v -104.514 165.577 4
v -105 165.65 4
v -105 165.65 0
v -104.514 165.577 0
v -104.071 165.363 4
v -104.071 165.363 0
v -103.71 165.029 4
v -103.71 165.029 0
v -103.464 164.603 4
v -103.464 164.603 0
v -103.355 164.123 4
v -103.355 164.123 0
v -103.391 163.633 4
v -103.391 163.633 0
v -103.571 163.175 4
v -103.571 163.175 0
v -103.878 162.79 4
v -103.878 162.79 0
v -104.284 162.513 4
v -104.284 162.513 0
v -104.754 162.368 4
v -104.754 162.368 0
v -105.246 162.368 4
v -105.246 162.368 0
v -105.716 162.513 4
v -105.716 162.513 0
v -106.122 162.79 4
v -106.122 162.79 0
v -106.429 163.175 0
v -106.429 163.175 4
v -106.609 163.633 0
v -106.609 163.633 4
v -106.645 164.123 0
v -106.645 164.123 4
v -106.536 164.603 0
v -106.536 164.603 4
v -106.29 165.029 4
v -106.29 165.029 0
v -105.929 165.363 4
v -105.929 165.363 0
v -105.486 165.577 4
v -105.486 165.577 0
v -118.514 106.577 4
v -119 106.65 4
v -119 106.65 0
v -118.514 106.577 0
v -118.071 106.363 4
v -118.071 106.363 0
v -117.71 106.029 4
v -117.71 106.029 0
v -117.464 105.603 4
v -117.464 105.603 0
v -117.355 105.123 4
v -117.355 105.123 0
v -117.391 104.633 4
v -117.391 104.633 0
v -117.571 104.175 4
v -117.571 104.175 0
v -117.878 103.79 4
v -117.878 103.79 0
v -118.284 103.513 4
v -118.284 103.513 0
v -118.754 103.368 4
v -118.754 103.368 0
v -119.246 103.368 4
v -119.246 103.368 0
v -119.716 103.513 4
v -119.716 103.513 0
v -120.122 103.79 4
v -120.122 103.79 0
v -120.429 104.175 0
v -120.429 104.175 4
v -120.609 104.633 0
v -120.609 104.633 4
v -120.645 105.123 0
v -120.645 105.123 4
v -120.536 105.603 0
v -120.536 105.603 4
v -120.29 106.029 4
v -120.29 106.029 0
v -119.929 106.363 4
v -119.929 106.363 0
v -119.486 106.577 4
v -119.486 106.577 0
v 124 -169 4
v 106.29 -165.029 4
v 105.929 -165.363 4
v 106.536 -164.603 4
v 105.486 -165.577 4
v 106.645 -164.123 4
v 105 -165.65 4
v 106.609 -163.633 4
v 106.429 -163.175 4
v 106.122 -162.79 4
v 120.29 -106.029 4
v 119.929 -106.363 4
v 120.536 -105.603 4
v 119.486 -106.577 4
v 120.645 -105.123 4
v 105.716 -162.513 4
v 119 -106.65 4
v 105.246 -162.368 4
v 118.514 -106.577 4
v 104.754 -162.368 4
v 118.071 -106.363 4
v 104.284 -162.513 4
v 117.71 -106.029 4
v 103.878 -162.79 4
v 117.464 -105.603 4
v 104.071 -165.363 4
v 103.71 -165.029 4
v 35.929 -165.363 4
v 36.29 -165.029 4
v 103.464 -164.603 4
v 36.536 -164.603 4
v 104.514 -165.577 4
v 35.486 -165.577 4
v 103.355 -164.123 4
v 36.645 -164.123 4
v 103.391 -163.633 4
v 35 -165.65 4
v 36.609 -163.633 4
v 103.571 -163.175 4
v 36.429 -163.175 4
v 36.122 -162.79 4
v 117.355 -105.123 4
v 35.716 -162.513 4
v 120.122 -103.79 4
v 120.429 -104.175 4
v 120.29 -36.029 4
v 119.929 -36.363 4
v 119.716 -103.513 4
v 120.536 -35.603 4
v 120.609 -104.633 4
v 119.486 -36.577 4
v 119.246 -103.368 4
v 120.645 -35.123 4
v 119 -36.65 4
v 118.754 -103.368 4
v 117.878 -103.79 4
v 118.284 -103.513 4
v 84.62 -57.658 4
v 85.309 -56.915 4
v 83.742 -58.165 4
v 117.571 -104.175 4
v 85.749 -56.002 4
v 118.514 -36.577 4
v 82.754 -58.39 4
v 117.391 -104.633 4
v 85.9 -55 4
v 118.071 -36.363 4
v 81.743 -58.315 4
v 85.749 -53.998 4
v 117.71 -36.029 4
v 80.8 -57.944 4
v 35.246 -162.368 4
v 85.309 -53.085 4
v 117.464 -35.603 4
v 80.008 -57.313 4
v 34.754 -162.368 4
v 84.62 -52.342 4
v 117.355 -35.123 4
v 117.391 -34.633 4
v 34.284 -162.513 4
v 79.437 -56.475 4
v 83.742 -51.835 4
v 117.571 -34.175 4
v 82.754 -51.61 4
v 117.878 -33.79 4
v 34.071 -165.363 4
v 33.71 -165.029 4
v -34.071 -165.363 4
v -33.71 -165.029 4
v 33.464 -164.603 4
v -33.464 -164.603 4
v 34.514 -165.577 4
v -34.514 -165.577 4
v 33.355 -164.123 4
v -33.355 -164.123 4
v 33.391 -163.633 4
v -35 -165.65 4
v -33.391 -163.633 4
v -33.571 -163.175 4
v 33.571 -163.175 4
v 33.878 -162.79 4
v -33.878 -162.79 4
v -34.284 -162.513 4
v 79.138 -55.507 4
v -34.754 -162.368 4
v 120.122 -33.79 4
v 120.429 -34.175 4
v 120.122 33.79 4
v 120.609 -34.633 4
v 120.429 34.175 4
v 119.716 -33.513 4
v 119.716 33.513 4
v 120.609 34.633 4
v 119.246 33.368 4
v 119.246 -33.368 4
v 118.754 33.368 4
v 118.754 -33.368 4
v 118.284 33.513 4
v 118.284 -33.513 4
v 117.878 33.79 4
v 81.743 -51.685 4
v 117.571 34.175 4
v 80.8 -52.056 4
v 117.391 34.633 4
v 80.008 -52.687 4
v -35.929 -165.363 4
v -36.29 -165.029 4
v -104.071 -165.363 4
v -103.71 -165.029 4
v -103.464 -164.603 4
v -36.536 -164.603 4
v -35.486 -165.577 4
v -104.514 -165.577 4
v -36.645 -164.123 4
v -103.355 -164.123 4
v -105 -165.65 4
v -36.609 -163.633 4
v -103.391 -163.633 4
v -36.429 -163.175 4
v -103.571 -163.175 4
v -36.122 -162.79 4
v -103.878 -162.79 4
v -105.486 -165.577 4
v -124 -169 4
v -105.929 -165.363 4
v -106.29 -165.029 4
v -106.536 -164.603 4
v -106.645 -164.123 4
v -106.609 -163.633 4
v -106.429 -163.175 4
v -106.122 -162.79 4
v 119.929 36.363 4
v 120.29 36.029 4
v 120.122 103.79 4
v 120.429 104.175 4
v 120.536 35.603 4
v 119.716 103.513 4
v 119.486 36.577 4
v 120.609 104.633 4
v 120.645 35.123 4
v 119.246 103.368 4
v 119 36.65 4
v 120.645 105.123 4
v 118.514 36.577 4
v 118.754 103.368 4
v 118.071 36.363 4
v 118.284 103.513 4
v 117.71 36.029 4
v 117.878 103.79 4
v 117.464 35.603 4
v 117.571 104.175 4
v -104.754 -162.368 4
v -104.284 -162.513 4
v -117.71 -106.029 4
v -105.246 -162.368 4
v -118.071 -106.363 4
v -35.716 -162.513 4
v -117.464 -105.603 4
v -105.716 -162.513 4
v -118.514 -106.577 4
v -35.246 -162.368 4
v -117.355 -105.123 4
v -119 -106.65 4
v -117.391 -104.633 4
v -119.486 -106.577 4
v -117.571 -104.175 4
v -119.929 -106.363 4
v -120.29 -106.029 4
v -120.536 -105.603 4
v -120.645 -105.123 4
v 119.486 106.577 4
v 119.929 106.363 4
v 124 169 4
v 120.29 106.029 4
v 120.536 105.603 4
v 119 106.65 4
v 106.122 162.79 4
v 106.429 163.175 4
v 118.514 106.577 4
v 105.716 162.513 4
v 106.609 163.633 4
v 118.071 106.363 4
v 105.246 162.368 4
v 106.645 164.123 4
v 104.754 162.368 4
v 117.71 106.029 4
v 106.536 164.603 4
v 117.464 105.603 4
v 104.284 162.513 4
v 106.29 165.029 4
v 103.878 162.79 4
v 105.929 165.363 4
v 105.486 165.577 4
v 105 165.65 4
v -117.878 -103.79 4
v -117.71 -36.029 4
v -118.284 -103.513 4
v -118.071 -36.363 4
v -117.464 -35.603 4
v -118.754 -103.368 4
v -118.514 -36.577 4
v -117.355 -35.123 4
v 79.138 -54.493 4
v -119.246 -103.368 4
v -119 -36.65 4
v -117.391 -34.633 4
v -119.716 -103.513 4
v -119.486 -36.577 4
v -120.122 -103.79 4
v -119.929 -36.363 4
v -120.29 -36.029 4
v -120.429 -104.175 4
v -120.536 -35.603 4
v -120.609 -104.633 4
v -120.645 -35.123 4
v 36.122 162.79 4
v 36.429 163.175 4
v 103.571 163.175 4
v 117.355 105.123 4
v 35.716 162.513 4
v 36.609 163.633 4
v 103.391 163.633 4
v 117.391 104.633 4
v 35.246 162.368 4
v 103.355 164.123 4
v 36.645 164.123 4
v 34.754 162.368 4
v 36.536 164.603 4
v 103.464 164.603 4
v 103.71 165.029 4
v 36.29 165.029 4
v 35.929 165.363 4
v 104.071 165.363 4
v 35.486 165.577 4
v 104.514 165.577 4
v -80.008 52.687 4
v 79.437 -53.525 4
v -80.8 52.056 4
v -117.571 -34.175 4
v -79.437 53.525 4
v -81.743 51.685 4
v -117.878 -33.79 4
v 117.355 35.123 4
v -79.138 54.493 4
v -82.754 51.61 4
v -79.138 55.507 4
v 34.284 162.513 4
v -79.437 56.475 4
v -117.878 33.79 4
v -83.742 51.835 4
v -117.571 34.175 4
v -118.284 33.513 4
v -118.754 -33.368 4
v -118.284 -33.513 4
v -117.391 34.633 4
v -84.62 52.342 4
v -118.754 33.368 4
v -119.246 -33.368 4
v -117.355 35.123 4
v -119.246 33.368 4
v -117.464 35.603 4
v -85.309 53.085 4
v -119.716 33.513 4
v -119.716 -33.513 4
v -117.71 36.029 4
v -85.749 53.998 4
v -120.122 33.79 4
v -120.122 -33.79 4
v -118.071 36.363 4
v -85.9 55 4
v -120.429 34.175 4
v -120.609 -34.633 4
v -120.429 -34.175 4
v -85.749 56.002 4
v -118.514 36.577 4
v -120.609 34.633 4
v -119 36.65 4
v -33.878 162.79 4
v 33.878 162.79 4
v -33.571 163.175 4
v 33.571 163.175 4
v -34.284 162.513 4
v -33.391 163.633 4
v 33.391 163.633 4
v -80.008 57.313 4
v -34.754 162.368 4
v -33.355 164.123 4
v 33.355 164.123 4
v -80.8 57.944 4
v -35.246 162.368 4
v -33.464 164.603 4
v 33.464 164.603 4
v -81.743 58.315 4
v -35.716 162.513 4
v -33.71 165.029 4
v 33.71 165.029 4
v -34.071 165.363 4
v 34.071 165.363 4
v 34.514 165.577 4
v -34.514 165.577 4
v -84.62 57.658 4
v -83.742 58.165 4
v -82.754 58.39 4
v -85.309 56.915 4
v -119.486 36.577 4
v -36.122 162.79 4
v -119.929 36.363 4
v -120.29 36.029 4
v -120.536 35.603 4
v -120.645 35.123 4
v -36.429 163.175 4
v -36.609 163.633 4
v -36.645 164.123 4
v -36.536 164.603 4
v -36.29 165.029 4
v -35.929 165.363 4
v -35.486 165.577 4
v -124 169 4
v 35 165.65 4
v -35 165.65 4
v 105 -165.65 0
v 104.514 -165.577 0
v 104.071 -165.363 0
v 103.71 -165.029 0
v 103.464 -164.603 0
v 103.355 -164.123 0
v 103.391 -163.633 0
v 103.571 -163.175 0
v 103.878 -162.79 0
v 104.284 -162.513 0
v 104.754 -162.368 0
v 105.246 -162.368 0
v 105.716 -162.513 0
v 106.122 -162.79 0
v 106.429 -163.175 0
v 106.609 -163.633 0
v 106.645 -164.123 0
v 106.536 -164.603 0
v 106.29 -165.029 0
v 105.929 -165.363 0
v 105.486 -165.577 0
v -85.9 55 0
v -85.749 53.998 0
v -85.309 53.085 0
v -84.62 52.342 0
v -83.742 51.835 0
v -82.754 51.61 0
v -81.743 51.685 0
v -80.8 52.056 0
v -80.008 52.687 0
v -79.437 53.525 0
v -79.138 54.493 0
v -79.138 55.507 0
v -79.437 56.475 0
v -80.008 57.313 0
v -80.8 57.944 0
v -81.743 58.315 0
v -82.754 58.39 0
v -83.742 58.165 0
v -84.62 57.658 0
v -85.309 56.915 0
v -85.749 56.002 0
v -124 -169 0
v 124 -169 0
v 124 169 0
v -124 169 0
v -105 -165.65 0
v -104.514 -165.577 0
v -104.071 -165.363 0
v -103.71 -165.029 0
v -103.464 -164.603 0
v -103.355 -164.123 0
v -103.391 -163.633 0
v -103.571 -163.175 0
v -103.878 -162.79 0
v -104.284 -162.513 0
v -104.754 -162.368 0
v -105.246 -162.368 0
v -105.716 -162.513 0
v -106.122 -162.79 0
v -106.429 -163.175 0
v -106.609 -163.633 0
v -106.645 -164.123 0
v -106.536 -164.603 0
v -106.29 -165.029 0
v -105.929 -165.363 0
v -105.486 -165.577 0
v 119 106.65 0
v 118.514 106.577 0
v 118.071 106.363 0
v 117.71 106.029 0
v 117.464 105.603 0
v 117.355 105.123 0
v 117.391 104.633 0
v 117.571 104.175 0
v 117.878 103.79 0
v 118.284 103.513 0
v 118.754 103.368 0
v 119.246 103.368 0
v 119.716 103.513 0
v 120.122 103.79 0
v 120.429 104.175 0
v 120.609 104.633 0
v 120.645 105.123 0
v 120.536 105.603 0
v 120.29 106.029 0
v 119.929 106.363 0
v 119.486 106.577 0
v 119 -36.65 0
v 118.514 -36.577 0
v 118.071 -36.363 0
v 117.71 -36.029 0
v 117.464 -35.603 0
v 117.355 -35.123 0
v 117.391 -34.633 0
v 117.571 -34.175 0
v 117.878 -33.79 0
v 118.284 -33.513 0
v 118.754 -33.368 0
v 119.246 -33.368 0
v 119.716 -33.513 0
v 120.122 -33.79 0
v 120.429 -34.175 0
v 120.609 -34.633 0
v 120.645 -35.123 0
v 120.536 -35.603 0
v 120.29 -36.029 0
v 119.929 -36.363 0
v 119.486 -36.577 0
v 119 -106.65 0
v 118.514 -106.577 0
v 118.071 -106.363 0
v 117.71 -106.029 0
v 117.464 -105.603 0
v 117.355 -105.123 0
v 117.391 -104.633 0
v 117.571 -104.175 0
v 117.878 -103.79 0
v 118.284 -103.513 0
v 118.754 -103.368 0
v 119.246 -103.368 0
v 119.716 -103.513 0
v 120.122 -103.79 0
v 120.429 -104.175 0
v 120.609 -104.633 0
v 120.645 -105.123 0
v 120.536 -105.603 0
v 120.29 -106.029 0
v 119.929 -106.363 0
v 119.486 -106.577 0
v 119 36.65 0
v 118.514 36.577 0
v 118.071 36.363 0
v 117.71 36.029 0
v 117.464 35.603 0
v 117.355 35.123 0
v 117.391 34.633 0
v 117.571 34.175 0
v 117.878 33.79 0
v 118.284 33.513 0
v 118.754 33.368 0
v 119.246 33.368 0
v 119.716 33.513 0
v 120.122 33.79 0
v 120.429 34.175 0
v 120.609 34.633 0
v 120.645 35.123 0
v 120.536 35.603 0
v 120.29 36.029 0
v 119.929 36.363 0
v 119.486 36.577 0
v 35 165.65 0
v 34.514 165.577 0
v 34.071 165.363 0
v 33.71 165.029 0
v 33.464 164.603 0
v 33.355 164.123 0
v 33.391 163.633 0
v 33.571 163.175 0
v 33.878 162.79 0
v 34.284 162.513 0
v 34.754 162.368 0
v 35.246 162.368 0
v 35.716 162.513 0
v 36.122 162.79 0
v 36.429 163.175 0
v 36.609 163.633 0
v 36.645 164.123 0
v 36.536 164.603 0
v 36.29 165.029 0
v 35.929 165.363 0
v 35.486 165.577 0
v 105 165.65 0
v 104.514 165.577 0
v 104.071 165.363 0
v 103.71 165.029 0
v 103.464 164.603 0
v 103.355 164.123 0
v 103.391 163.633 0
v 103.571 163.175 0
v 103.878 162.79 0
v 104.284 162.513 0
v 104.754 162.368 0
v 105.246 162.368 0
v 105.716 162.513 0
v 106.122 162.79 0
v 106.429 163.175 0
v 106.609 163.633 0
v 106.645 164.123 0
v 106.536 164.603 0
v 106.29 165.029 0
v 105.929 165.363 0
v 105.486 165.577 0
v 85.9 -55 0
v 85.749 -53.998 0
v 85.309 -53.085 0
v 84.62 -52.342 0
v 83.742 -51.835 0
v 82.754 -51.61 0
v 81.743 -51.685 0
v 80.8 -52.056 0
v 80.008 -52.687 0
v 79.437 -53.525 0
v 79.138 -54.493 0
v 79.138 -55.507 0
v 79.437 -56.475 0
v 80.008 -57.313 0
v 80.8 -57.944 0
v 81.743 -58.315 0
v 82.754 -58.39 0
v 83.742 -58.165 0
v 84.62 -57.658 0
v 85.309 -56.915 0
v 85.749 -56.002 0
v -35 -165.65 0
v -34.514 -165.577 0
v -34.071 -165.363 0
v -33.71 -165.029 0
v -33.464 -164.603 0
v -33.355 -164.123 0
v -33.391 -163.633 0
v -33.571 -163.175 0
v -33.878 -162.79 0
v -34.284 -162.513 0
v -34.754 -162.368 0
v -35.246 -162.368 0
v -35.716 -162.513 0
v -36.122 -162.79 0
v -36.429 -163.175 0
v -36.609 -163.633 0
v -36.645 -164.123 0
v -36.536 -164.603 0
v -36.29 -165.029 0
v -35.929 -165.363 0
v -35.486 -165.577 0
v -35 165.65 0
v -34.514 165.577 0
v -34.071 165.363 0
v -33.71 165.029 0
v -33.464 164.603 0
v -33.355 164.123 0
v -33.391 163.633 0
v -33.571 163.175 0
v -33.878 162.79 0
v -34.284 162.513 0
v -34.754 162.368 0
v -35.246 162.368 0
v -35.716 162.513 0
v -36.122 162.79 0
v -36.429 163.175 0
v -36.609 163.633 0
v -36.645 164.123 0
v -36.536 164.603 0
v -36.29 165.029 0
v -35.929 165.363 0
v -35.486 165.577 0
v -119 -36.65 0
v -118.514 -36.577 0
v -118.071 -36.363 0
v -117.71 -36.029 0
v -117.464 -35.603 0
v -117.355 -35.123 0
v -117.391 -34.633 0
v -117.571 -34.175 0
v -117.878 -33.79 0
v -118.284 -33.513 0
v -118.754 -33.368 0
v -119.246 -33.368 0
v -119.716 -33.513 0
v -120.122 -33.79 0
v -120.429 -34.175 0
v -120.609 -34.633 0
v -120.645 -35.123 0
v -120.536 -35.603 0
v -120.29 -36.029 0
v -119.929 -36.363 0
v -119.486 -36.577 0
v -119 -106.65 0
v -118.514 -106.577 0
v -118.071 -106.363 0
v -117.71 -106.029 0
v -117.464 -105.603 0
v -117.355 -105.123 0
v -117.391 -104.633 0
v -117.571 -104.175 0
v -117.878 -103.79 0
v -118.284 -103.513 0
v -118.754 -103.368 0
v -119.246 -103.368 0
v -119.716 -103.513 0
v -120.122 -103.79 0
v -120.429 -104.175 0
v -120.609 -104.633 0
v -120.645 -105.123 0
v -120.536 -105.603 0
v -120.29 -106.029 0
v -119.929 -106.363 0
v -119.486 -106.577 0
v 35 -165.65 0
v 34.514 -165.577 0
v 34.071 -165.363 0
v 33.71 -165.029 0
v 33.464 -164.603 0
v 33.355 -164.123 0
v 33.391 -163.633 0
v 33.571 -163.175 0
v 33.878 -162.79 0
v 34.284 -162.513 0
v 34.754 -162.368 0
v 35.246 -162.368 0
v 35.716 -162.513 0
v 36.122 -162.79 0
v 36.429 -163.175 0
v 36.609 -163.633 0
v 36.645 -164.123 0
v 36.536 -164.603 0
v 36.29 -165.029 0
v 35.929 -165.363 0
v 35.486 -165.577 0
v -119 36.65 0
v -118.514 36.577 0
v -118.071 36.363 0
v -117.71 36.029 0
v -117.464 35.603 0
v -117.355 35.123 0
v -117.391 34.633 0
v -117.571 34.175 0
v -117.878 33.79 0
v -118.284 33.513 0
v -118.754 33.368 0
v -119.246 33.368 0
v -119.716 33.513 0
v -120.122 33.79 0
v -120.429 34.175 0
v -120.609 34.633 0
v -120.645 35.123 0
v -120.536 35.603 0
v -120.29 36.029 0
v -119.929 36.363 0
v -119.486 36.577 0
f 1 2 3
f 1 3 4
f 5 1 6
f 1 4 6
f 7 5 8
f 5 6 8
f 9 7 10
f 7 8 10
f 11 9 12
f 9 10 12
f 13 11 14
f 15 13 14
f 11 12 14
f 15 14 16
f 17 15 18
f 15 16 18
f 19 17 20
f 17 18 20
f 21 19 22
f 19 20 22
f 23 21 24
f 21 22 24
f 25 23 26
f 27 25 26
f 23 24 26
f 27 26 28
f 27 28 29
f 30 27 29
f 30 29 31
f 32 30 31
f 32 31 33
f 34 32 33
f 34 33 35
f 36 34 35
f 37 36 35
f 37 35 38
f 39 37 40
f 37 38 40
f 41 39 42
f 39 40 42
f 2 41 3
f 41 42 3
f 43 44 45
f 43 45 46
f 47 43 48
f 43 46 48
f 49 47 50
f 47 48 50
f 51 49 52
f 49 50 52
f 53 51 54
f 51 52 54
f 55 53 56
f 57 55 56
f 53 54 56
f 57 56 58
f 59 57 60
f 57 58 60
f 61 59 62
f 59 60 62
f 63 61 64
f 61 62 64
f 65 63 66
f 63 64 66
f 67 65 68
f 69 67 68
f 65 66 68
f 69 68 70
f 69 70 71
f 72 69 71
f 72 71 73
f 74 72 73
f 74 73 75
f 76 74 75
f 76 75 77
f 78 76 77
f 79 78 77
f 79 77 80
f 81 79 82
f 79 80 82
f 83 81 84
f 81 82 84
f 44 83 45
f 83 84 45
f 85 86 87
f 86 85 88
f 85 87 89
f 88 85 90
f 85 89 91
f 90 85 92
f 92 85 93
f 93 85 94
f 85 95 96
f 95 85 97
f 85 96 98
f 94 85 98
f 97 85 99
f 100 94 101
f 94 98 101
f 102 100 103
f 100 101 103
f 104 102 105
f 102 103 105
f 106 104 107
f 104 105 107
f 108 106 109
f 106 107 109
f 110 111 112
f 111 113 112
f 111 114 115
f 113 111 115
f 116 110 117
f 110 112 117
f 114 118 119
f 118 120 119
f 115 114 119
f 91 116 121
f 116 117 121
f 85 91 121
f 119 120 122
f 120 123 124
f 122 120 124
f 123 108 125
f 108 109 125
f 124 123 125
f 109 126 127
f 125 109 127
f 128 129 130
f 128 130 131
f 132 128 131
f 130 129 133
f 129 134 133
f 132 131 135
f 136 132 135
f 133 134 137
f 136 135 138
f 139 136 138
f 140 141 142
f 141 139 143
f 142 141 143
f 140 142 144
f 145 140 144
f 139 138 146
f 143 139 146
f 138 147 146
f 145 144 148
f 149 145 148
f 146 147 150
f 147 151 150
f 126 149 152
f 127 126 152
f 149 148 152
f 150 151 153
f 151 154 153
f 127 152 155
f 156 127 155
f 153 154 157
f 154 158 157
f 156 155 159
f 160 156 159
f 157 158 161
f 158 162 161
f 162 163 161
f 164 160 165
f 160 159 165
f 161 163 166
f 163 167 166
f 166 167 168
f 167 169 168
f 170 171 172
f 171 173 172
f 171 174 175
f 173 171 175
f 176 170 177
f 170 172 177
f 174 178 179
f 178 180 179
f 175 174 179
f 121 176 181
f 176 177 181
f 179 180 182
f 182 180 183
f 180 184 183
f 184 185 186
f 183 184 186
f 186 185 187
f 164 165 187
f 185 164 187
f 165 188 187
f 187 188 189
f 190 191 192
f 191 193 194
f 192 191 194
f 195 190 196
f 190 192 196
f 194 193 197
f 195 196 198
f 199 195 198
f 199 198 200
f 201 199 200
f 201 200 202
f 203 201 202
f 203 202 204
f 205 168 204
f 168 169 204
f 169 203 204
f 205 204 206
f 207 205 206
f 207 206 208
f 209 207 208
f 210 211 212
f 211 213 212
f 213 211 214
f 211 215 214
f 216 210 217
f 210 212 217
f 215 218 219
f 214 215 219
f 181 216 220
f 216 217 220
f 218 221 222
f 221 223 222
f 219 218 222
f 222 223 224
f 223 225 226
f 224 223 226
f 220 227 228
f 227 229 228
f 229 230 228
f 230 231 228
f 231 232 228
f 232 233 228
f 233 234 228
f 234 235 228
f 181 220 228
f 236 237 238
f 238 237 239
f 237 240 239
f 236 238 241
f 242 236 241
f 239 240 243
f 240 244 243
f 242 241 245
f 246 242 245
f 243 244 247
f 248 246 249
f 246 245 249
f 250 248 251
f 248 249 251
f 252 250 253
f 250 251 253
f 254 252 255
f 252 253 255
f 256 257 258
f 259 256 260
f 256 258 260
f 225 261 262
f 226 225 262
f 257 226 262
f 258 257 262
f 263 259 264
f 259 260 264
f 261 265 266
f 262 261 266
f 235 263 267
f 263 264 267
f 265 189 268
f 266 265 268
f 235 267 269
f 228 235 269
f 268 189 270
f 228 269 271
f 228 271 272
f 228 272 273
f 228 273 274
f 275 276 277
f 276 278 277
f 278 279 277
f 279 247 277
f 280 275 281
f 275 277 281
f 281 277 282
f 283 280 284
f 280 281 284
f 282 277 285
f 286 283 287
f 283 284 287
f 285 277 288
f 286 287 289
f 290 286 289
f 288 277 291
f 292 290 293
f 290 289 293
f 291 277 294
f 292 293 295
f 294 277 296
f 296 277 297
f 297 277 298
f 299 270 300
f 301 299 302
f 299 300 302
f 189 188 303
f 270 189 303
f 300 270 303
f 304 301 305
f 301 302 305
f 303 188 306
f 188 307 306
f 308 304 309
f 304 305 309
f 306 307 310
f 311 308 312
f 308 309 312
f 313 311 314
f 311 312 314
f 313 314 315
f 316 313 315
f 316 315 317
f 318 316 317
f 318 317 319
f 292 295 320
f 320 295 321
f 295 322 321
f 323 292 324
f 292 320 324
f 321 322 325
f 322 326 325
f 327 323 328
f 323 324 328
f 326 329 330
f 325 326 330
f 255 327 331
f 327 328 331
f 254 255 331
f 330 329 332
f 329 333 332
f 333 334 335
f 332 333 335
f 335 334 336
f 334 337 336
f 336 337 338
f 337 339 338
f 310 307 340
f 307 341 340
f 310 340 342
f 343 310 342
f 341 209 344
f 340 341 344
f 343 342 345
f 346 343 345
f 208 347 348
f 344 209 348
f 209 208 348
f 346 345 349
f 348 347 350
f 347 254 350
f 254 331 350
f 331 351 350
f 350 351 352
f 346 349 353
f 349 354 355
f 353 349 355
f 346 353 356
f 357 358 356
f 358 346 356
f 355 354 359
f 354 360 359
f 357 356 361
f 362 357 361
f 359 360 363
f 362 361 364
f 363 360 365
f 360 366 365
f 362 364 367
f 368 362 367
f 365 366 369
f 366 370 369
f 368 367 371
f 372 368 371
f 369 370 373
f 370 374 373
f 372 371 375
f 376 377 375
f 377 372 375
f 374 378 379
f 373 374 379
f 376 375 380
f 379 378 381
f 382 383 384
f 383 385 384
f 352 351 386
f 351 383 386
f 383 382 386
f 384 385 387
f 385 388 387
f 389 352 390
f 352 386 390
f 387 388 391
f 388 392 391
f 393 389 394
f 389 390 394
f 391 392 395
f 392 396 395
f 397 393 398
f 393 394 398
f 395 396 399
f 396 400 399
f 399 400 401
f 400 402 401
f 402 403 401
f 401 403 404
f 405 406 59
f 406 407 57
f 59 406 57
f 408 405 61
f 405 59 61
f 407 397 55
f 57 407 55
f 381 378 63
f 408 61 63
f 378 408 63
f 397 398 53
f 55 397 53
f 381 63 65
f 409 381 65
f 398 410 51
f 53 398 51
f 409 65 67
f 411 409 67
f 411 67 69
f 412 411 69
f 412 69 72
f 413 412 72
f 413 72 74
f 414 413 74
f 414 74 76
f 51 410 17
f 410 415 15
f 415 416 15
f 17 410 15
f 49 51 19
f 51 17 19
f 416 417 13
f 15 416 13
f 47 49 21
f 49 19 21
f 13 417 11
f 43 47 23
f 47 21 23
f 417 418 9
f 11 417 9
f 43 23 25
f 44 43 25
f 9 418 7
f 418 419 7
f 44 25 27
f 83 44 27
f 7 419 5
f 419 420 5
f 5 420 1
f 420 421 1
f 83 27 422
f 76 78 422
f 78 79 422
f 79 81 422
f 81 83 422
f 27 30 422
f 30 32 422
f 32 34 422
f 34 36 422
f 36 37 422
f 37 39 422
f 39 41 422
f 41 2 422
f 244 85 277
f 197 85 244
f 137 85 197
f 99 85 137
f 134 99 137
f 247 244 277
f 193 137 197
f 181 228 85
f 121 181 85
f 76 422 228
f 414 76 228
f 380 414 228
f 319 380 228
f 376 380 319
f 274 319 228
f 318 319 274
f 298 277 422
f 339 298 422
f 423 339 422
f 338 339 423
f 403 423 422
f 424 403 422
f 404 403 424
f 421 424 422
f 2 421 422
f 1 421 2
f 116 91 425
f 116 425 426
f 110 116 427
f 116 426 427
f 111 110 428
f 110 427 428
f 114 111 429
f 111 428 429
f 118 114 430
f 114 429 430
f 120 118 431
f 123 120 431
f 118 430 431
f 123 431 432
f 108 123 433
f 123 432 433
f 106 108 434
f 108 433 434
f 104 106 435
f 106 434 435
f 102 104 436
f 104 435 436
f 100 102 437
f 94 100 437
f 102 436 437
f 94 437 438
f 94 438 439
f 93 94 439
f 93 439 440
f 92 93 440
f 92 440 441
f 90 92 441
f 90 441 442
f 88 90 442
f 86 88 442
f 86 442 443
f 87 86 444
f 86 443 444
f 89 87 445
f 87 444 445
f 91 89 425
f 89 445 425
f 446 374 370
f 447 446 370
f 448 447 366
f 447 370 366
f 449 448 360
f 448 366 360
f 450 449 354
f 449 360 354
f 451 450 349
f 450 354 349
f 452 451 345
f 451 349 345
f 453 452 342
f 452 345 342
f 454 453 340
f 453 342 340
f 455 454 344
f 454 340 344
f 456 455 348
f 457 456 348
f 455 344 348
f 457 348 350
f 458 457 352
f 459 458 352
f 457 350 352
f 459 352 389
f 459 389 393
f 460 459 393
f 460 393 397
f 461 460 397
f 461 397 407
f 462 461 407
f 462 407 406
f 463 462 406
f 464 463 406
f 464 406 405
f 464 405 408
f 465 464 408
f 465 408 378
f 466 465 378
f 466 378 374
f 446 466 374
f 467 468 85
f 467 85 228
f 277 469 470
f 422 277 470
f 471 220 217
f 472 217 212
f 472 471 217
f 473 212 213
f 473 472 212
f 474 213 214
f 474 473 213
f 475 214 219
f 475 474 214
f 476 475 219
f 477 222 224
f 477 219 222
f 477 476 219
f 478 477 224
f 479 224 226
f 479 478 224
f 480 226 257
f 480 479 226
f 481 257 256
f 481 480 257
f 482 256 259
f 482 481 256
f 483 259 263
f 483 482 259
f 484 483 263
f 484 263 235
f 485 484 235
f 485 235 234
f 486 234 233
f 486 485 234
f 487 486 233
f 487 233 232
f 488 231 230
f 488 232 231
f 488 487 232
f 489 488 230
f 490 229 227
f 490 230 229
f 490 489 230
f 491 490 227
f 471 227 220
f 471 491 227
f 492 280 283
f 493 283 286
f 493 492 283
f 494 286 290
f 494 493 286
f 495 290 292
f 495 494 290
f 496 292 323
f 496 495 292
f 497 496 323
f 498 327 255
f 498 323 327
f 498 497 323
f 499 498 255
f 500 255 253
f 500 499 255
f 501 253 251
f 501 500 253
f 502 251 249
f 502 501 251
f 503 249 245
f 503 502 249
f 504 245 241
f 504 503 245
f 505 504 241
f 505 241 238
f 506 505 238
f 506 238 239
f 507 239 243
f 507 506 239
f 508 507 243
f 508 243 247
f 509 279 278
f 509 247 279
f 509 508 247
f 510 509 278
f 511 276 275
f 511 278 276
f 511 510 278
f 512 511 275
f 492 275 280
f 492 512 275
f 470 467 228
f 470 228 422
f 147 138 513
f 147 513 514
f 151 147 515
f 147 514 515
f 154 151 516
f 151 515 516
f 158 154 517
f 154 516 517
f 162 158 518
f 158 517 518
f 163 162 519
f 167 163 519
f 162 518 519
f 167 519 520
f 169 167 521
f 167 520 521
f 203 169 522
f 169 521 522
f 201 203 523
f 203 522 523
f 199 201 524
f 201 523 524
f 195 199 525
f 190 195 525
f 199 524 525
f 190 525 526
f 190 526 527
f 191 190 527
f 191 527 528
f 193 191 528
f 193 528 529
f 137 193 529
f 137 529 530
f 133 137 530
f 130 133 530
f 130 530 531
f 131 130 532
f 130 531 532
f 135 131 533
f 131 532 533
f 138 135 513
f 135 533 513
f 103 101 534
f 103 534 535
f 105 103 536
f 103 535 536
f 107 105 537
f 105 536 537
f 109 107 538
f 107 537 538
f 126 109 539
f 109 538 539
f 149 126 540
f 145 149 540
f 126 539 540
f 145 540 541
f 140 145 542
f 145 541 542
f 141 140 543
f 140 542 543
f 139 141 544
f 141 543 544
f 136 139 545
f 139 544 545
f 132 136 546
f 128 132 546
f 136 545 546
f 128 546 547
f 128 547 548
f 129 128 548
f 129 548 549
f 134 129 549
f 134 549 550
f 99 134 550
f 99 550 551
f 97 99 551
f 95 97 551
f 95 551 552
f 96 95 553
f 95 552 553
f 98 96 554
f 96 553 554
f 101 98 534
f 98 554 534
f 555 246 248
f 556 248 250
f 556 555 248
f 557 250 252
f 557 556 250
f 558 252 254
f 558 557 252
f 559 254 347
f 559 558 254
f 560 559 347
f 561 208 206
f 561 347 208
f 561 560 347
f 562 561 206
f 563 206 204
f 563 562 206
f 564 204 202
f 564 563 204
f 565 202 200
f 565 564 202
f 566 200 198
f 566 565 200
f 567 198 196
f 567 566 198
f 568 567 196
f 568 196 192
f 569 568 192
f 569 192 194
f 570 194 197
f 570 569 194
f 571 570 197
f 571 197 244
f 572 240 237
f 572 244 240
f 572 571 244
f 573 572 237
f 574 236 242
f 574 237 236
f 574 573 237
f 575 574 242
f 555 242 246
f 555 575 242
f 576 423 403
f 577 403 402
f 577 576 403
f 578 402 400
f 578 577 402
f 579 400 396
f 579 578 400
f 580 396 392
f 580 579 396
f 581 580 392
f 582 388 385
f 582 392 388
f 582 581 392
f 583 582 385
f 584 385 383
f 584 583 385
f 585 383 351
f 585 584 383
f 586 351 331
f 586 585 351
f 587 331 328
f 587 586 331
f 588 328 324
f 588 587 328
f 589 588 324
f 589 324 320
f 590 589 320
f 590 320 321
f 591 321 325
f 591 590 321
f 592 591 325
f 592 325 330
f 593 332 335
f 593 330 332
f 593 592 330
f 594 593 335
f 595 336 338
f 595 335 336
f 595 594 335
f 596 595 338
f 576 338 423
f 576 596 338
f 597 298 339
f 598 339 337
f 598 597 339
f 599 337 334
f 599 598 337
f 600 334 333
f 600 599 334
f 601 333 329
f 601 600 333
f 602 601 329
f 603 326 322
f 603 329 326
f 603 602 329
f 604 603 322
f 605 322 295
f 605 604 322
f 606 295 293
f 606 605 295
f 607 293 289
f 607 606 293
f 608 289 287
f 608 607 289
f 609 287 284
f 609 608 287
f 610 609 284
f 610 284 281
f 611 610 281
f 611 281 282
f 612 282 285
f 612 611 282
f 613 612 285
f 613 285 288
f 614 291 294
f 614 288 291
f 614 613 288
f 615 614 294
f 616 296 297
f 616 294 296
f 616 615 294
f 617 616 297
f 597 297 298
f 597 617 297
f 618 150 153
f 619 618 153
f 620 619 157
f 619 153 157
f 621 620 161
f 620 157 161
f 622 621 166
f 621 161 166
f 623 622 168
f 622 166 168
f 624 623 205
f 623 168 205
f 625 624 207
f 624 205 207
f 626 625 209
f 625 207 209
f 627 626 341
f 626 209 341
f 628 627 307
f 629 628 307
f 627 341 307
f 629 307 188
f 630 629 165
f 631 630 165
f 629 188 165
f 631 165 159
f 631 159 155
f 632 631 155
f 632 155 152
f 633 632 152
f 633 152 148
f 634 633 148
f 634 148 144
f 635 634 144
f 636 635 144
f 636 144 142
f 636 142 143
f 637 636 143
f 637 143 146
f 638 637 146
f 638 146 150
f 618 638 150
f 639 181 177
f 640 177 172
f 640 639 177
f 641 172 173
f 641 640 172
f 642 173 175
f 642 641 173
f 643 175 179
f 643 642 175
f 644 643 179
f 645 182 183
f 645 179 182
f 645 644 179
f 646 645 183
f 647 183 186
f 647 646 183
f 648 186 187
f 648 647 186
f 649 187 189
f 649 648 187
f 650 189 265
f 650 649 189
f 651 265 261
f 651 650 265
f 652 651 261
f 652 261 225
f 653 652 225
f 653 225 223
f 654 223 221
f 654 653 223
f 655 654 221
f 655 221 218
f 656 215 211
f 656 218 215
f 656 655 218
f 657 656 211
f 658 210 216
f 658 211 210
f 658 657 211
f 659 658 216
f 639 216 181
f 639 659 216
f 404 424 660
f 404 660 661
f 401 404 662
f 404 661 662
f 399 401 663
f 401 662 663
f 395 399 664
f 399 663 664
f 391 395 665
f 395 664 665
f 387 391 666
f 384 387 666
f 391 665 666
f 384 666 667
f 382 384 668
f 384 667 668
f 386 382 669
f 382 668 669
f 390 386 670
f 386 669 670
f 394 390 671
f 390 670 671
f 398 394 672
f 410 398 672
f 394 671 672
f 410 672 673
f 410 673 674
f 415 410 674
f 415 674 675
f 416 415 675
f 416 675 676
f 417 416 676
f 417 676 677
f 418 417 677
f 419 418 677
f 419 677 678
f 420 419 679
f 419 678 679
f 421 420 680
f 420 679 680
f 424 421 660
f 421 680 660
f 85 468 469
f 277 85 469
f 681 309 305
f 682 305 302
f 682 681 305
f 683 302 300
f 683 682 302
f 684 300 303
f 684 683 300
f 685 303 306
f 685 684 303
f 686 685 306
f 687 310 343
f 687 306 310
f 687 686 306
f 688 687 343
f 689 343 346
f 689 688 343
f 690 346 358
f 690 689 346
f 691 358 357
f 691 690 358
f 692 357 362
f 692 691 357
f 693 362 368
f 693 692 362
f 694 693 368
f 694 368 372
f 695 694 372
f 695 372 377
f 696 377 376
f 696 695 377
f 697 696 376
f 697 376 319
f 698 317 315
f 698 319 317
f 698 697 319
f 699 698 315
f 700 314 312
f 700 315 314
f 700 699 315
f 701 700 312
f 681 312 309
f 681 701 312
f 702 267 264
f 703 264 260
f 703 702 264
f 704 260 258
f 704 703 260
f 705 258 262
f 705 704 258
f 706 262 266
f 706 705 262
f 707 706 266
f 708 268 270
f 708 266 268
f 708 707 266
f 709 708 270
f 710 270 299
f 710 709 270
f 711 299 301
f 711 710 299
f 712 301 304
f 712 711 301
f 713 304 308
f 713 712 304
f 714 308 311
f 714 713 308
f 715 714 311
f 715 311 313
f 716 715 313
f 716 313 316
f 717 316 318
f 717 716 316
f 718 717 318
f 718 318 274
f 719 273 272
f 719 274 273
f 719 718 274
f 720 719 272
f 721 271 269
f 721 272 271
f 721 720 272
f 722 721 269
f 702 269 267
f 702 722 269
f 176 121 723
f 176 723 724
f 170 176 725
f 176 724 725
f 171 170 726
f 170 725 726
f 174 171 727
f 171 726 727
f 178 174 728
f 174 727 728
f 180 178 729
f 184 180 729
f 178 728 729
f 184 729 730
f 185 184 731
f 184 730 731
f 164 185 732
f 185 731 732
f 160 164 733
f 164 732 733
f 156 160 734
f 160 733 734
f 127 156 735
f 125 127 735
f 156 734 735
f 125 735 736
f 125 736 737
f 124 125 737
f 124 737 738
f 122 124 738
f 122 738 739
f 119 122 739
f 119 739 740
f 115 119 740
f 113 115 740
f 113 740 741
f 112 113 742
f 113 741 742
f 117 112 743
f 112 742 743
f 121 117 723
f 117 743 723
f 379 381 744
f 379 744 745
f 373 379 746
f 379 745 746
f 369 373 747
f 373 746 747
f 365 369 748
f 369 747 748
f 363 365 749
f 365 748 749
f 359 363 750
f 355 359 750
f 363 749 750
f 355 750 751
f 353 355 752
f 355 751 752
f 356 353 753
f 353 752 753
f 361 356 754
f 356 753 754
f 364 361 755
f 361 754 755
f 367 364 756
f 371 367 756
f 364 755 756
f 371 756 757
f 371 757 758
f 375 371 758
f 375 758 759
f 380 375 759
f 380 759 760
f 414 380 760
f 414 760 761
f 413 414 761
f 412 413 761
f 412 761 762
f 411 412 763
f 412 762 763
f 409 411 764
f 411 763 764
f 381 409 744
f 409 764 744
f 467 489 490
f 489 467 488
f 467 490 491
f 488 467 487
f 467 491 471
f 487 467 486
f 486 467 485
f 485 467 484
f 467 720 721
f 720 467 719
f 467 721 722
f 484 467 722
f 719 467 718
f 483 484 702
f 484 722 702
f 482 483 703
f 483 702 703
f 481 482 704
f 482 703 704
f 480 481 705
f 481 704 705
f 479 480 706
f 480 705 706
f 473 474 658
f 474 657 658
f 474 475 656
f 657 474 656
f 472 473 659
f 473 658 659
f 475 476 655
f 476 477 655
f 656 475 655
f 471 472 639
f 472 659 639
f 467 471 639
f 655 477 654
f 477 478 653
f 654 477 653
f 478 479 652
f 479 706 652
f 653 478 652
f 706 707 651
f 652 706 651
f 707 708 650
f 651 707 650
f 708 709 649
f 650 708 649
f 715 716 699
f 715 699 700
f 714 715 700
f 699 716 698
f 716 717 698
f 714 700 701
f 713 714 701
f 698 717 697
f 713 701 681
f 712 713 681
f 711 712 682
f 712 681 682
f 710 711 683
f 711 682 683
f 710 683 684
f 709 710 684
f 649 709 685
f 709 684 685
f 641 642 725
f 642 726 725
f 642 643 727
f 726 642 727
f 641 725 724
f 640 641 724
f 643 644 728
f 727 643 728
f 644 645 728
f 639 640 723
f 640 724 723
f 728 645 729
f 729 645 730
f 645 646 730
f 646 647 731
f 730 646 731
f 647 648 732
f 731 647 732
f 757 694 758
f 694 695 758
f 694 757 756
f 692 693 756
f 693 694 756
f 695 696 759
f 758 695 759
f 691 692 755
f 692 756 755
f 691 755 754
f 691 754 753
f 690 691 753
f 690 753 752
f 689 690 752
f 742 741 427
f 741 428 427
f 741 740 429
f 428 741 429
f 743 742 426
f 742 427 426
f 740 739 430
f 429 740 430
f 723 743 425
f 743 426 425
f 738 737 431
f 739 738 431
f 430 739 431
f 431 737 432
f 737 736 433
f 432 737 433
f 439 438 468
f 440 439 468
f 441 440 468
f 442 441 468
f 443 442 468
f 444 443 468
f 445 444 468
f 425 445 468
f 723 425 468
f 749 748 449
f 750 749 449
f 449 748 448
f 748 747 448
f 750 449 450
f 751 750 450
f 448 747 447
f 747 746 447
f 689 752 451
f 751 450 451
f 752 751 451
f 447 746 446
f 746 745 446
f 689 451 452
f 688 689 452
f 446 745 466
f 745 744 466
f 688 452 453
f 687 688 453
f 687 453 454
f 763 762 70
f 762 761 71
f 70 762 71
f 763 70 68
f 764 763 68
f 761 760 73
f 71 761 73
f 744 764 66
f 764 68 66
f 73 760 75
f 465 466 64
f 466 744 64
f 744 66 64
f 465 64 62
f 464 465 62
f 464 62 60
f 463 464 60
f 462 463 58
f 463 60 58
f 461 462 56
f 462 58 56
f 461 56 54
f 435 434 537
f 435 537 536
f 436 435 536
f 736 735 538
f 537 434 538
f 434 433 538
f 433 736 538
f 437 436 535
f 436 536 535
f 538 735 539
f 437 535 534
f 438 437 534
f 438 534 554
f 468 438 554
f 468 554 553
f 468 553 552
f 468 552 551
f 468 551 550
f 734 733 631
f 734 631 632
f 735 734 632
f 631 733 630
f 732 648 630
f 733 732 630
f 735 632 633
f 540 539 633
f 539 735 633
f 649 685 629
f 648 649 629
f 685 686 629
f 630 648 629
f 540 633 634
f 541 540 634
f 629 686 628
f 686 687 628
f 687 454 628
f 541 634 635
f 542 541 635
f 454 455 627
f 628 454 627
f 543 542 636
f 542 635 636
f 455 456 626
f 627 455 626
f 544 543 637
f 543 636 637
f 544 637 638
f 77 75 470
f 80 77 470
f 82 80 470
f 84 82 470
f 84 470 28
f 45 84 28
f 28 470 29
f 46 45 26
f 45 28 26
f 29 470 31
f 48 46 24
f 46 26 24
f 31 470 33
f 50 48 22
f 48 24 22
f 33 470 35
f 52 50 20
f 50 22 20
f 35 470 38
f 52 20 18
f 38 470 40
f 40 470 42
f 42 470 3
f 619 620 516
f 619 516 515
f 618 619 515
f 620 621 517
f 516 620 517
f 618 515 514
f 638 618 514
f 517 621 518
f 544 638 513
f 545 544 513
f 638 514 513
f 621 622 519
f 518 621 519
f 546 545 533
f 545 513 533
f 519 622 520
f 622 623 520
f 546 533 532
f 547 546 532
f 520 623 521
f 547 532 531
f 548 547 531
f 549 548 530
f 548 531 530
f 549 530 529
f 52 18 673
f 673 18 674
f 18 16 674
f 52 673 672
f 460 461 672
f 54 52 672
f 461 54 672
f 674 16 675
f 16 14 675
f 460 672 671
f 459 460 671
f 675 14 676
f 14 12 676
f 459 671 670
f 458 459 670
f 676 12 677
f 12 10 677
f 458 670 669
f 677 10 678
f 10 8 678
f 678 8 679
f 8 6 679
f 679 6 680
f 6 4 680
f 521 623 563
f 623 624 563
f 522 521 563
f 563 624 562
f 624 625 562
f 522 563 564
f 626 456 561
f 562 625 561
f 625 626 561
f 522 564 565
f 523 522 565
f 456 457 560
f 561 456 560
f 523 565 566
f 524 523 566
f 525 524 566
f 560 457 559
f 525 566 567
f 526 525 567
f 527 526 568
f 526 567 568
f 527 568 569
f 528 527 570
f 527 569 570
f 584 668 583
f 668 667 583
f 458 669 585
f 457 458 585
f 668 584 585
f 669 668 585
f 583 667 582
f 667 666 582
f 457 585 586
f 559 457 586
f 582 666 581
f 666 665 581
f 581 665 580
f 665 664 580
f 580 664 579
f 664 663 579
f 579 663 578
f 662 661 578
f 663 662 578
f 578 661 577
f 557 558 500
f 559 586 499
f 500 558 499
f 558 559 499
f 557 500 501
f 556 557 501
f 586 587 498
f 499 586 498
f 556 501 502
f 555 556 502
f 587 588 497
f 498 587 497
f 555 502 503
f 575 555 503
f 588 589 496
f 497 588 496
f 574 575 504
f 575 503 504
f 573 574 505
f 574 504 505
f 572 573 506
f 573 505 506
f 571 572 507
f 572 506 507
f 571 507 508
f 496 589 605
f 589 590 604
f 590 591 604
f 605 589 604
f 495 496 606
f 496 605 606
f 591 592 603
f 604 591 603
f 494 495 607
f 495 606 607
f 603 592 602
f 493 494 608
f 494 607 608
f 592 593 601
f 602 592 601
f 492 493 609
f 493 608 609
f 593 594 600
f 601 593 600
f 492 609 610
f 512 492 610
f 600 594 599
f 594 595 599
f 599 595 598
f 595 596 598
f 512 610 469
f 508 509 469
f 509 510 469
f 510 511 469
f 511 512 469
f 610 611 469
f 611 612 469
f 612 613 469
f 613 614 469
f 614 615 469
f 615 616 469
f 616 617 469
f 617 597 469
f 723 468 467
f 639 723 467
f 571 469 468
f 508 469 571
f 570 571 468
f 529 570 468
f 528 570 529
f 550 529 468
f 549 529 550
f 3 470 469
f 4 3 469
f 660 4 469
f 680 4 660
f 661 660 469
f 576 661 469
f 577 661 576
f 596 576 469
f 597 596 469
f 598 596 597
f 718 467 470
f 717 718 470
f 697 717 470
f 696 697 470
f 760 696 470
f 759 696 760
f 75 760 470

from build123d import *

# Parameters (mm, degrees)
SKETCH1_W                       = 260
SKETCH1_H                       = 350
BOSS_EXTRUDE1_DEPTH             = 58
FILLET1_R                       = 54
SKIZZE1_W                       = 260
SKIZZE1_H                       = 350
SKIZZE1_W_2                     = 248
SKIZZE1_H_2                     = 338
SCHNITT_LINEAR_AUSTRAGEN1_DEPTH = 4
M4_TAPPED_HOLE1_AT_2_COUNT      = 2
M4_TAPPED_HOLE1_AT_2_PITCH      = 70
M4_TAPPED_HOLE1_AT_3_COUNT      = 2
M4_TAPPED_HOLE1_AT_3_PITCH      = 60.638271743
M4_TAPPED_HOLE1_AT_4_COUNT      = 2
M4_TAPPED_HOLE1_AT_4_PITCH      = 129.757466067
SKETCH2_W                       = 260
SKETCH2_H                       = 350
CUT_EXTRUDE1_DEPTH              = 225.590738901
M8_TAPPED_HOLE1_D               = 6.8
CIRPATTERN1_COUNT               = 2


with BuildPart() as part:
    # Sketch1 → Boss-Extrude1 (new body)
    with BuildSketch(Plane.XY):
        Rectangle(SKETCH1_W, SKETCH1_H)
    extrude(amount=BOSS_EXTRUDE1_DEPTH)

    # Fillet1
    fillet1_edges = [part.edges().sort_by_distance(p)[0] for p in [
        (-130, 0, 58),
        (0, -175, 58),
        (130, 0, 58),
        (0, 175, 58),
    ]]
    fillet(fillet1_edges, radius=FILLET1_R)

    # Skizze1 → Schnitt-Linear austragen1 (cut)
    with BuildSketch(Plane(origin=(0, 0, 0), x_dir=(-1, 0, 0), z_dir=(0, 0, -1))):
        Rectangle(SKIZZE1_W, SKIZZE1_H)
        Rectangle(SKIZZE1_W_2, SKIZZE1_H_2, mode=Mode.SUBTRACT)
    extrude(amount=-SCHNITT_LINEAR_AUSTRAGEN1_DEPTH, mode=Mode.SUBTRACT)

    # Skizze2 → M4 Tapped Hole1 (revolve, cut)
    with BuildSketch(Plane(origin=(105, 164, 0), x_dir=(0, 1, 0), z_dir=(1, 0, 0))):
        Polygon((0, 0), (0, 12.491420021), (1.65, 11.5), (1.65, 0), align=None)
    m4_tapped_hole1 = revolve(axis=Axis((105, 164, -6.35), (0, 0, 1)), mode=Mode.SUBTRACT)

    # M4 Tapped Hole1 at 2: M4 Tapped Hole1 ×2
    with Locations(*[(-i * M4_TAPPED_HOLE1_AT_2_PITCH, 0, 0) for i in range(1, M4_TAPPED_HOLE1_AT_2_COUNT)]):
        add(m4_tapped_hole1, mode=Mode.SUBTRACT)

    # M4 Tapped Hole1 at 3: M4 Tapped Hole1 ×2
    with Locations(*[Vector(0.23087729246792194, -0.9729828754005292, 0) * (i * M4_TAPPED_HOLE1_AT_3_PITCH) for i in range(1, M4_TAPPED_HOLE1_AT_3_COUNT)]):
        add(m4_tapped_hole1, mode=Mode.SUBTRACT)

    # M4 Tapped Hole1 at 4: M4 Tapped Hole1 ×2
    with Locations(*[Vector(0.10789359891495286, -0.9941624471449217, 0) * (i * M4_TAPPED_HOLE1_AT_4_PITCH) for i in range(1, M4_TAPPED_HOLE1_AT_4_COUNT)]):
        add(m4_tapped_hole1, mode=Mode.SUBTRACT)

    # Spiegeln1: M4 Tapped Hole1 across plane
    add(m4_tapped_hole1.mirror(Plane.ZX), mode=Mode.SUBTRACT)

    # Spiegeln1 copy 1 sketch → Spiegeln1 copy 1 (revolve, cut)
    with BuildSketch(Plane(origin=(35, -164, 0), x_dir=(0, -1, 0), z_dir=(1, 0, 0))):
        Polygon((0, 0), (0, -12.491420021), (1.65, -11.5), (1.65, 0), align=None)
    revolve(axis=Axis((35, -164, -6.35), (0, 0, -1)), mode=Mode.SUBTRACT)

    # Spiegeln1 copy 2 sketch → Spiegeln1 copy 2 (revolve, cut)
    with BuildSketch(Plane(origin=(119, -105, 0), x_dir=(0, -1, 0), z_dir=(1, 0, 0))):
        Polygon((0, 0), (0, -12.491420021), (1.65, -11.5), (1.65, 0), align=None)
    revolve(axis=Axis((119, -105, -6.35), (0, 0, -1)), mode=Mode.SUBTRACT)

    # Spiegeln1 copy 3 sketch → Spiegeln1 copy 3 (revolve, cut)
    with BuildSketch(Plane(origin=(119, -35, 0), x_dir=(0, -1, 0), z_dir=(1, 0, 0))):
        Polygon((0, 0), (0, -12.491420021), (1.65, -11.5), (1.65, 0), align=None)
    revolve(axis=Axis((119, -35, -6.35), (0, 0, -1)), mode=Mode.SUBTRACT)

    # Spiegeln2: M4 Tapped Hole1 across plane
    add(m4_tapped_hole1.mirror(Plane(origin=(0, 0, 0), x_dir=(0, 0, 1), z_dir=(1, 0, 0))), mode=Mode.SUBTRACT)

    # Spiegeln2 copy 1 sketch → Spiegeln2 copy 1 (revolve, cut)
    with BuildSketch(Plane(origin=(-35, 164, 0), x_dir=(0, 1, 0), z_dir=(-1, 0, 0))):
        Polygon((0, 0), (0, -12.491420021), (1.65, -11.5), (1.65, 0), align=None)
    revolve(axis=Axis((-35, 164, -6.35), (0, 0, -1)), mode=Mode.SUBTRACT)

    # Spiegeln2 copy 2 sketch → Spiegeln2 copy 2 (revolve, cut)
    with BuildSketch(Plane(origin=(-119, 105, 0), x_dir=(0, 1, 0), z_dir=(-1, 0, 0))):
        Polygon((0, 0), (0, -12.491420021), (1.65, -11.5), (1.65, 0), align=None)
    revolve(axis=Axis((-119, 105, -6.35), (0, 0, -1)), mode=Mode.SUBTRACT)

    # Spiegeln2 copy 3 sketch → Spiegeln2 copy 3 (revolve, cut)
    with BuildSketch(Plane(origin=(-119, 35, 0), x_dir=(0, 1, 0), z_dir=(-1, 0, 0))):
        Polygon((0, 0), (0, -12.491420021), (1.65, -11.5), (1.65, 0), align=None)
    revolve(axis=Axis((-119, 35, -6.35), (0, 0, -1)), mode=Mode.SUBTRACT)

    # Spiegeln2 copy 4 sketch → Spiegeln2 copy 4 (revolve, cut)
    with BuildSketch(Plane(origin=(-105, -164, 0), x_dir=(0, -1, 0), z_dir=(-1, 0, 0))):
        Polygon((0, 0), (0, 12.491420021), (1.65, 11.5), (1.65, 0), align=None)
    revolve(axis=Axis((-105, -164, -6.35), (0, 0, 1)), mode=Mode.SUBTRACT)

    # Spiegeln2 copy 5 sketch → Spiegeln2 copy 5 (revolve, cut)
    with BuildSketch(Plane(origin=(-35, -164, 0), x_dir=(0, -1, 0), z_dir=(-1, 0, 0))):
        Polygon((0, 0), (0, 12.491420021), (1.65, 11.5), (1.65, 0), align=None)
    revolve(axis=Axis((-35, -164, -6.35), (0, 0, 1)), mode=Mode.SUBTRACT)

    # Spiegeln2 copy 6 sketch → Spiegeln2 copy 6 (revolve, cut)
    with BuildSketch(Plane(origin=(-119, -105, 0), x_dir=(0, -1, 0), z_dir=(-1, 0, 0))):
        Polygon((0, 0), (0, 12.491420021), (1.65, 11.5), (1.65, 0), align=None)
    revolve(axis=Axis((-119, -105, -6.35), (0, 0, 1)), mode=Mode.SUBTRACT)

    # Spiegeln2 copy 7 sketch → Spiegeln2 copy 7 (revolve, cut)
    with BuildSketch(Plane(origin=(-119, -35, 0), x_dir=(0, -1, 0), z_dir=(-1, 0, 0))):
        Polygon((0, 0), (0, 12.491420021), (1.65, 11.5), (1.65, 0), align=None)
    revolve(axis=Axis((-119, -35, -6.35), (0, 0, 1)), mode=Mode.SUBTRACT)

    # Sketch2 → Cut-Extrude1 (cut, through all)
    with BuildSketch(Plane(origin=(0, 0, 4), x_dir=(-1, 0, 0), z_dir=(0, 0, -1))):
        Rectangle(SKETCH2_W, SKETCH2_H)
    extrude(amount=-CUT_EXTRUDE1_DEPTH, mode=Mode.SUBTRACT)

    # M8 Tapped Hole1 (through all)
    with Locations(Plane(origin=(0, 0, 0), x_dir=(-1, 0, 0), z_dir=(0, 0, -1))):
        with Locations((-82.5, -55)):
            m8_tapped_hole1 = Hole(M8_TAPPED_HOLE1_D / 2)

    # CirPattern1: M8 Tapped Hole1 ×2 about axis
    cirpattern1_axis = Axis((0, 0, -0.2), (0, 0, 1))
    for i in range(1, CIRPATTERN1_COUNT):
        add(m8_tapped_hole1.rotate(cirpattern1_axis, i * 360 / CIRPATTERN1_COUNT), mode=Mode.SUBTRACT)


solid = part.part
